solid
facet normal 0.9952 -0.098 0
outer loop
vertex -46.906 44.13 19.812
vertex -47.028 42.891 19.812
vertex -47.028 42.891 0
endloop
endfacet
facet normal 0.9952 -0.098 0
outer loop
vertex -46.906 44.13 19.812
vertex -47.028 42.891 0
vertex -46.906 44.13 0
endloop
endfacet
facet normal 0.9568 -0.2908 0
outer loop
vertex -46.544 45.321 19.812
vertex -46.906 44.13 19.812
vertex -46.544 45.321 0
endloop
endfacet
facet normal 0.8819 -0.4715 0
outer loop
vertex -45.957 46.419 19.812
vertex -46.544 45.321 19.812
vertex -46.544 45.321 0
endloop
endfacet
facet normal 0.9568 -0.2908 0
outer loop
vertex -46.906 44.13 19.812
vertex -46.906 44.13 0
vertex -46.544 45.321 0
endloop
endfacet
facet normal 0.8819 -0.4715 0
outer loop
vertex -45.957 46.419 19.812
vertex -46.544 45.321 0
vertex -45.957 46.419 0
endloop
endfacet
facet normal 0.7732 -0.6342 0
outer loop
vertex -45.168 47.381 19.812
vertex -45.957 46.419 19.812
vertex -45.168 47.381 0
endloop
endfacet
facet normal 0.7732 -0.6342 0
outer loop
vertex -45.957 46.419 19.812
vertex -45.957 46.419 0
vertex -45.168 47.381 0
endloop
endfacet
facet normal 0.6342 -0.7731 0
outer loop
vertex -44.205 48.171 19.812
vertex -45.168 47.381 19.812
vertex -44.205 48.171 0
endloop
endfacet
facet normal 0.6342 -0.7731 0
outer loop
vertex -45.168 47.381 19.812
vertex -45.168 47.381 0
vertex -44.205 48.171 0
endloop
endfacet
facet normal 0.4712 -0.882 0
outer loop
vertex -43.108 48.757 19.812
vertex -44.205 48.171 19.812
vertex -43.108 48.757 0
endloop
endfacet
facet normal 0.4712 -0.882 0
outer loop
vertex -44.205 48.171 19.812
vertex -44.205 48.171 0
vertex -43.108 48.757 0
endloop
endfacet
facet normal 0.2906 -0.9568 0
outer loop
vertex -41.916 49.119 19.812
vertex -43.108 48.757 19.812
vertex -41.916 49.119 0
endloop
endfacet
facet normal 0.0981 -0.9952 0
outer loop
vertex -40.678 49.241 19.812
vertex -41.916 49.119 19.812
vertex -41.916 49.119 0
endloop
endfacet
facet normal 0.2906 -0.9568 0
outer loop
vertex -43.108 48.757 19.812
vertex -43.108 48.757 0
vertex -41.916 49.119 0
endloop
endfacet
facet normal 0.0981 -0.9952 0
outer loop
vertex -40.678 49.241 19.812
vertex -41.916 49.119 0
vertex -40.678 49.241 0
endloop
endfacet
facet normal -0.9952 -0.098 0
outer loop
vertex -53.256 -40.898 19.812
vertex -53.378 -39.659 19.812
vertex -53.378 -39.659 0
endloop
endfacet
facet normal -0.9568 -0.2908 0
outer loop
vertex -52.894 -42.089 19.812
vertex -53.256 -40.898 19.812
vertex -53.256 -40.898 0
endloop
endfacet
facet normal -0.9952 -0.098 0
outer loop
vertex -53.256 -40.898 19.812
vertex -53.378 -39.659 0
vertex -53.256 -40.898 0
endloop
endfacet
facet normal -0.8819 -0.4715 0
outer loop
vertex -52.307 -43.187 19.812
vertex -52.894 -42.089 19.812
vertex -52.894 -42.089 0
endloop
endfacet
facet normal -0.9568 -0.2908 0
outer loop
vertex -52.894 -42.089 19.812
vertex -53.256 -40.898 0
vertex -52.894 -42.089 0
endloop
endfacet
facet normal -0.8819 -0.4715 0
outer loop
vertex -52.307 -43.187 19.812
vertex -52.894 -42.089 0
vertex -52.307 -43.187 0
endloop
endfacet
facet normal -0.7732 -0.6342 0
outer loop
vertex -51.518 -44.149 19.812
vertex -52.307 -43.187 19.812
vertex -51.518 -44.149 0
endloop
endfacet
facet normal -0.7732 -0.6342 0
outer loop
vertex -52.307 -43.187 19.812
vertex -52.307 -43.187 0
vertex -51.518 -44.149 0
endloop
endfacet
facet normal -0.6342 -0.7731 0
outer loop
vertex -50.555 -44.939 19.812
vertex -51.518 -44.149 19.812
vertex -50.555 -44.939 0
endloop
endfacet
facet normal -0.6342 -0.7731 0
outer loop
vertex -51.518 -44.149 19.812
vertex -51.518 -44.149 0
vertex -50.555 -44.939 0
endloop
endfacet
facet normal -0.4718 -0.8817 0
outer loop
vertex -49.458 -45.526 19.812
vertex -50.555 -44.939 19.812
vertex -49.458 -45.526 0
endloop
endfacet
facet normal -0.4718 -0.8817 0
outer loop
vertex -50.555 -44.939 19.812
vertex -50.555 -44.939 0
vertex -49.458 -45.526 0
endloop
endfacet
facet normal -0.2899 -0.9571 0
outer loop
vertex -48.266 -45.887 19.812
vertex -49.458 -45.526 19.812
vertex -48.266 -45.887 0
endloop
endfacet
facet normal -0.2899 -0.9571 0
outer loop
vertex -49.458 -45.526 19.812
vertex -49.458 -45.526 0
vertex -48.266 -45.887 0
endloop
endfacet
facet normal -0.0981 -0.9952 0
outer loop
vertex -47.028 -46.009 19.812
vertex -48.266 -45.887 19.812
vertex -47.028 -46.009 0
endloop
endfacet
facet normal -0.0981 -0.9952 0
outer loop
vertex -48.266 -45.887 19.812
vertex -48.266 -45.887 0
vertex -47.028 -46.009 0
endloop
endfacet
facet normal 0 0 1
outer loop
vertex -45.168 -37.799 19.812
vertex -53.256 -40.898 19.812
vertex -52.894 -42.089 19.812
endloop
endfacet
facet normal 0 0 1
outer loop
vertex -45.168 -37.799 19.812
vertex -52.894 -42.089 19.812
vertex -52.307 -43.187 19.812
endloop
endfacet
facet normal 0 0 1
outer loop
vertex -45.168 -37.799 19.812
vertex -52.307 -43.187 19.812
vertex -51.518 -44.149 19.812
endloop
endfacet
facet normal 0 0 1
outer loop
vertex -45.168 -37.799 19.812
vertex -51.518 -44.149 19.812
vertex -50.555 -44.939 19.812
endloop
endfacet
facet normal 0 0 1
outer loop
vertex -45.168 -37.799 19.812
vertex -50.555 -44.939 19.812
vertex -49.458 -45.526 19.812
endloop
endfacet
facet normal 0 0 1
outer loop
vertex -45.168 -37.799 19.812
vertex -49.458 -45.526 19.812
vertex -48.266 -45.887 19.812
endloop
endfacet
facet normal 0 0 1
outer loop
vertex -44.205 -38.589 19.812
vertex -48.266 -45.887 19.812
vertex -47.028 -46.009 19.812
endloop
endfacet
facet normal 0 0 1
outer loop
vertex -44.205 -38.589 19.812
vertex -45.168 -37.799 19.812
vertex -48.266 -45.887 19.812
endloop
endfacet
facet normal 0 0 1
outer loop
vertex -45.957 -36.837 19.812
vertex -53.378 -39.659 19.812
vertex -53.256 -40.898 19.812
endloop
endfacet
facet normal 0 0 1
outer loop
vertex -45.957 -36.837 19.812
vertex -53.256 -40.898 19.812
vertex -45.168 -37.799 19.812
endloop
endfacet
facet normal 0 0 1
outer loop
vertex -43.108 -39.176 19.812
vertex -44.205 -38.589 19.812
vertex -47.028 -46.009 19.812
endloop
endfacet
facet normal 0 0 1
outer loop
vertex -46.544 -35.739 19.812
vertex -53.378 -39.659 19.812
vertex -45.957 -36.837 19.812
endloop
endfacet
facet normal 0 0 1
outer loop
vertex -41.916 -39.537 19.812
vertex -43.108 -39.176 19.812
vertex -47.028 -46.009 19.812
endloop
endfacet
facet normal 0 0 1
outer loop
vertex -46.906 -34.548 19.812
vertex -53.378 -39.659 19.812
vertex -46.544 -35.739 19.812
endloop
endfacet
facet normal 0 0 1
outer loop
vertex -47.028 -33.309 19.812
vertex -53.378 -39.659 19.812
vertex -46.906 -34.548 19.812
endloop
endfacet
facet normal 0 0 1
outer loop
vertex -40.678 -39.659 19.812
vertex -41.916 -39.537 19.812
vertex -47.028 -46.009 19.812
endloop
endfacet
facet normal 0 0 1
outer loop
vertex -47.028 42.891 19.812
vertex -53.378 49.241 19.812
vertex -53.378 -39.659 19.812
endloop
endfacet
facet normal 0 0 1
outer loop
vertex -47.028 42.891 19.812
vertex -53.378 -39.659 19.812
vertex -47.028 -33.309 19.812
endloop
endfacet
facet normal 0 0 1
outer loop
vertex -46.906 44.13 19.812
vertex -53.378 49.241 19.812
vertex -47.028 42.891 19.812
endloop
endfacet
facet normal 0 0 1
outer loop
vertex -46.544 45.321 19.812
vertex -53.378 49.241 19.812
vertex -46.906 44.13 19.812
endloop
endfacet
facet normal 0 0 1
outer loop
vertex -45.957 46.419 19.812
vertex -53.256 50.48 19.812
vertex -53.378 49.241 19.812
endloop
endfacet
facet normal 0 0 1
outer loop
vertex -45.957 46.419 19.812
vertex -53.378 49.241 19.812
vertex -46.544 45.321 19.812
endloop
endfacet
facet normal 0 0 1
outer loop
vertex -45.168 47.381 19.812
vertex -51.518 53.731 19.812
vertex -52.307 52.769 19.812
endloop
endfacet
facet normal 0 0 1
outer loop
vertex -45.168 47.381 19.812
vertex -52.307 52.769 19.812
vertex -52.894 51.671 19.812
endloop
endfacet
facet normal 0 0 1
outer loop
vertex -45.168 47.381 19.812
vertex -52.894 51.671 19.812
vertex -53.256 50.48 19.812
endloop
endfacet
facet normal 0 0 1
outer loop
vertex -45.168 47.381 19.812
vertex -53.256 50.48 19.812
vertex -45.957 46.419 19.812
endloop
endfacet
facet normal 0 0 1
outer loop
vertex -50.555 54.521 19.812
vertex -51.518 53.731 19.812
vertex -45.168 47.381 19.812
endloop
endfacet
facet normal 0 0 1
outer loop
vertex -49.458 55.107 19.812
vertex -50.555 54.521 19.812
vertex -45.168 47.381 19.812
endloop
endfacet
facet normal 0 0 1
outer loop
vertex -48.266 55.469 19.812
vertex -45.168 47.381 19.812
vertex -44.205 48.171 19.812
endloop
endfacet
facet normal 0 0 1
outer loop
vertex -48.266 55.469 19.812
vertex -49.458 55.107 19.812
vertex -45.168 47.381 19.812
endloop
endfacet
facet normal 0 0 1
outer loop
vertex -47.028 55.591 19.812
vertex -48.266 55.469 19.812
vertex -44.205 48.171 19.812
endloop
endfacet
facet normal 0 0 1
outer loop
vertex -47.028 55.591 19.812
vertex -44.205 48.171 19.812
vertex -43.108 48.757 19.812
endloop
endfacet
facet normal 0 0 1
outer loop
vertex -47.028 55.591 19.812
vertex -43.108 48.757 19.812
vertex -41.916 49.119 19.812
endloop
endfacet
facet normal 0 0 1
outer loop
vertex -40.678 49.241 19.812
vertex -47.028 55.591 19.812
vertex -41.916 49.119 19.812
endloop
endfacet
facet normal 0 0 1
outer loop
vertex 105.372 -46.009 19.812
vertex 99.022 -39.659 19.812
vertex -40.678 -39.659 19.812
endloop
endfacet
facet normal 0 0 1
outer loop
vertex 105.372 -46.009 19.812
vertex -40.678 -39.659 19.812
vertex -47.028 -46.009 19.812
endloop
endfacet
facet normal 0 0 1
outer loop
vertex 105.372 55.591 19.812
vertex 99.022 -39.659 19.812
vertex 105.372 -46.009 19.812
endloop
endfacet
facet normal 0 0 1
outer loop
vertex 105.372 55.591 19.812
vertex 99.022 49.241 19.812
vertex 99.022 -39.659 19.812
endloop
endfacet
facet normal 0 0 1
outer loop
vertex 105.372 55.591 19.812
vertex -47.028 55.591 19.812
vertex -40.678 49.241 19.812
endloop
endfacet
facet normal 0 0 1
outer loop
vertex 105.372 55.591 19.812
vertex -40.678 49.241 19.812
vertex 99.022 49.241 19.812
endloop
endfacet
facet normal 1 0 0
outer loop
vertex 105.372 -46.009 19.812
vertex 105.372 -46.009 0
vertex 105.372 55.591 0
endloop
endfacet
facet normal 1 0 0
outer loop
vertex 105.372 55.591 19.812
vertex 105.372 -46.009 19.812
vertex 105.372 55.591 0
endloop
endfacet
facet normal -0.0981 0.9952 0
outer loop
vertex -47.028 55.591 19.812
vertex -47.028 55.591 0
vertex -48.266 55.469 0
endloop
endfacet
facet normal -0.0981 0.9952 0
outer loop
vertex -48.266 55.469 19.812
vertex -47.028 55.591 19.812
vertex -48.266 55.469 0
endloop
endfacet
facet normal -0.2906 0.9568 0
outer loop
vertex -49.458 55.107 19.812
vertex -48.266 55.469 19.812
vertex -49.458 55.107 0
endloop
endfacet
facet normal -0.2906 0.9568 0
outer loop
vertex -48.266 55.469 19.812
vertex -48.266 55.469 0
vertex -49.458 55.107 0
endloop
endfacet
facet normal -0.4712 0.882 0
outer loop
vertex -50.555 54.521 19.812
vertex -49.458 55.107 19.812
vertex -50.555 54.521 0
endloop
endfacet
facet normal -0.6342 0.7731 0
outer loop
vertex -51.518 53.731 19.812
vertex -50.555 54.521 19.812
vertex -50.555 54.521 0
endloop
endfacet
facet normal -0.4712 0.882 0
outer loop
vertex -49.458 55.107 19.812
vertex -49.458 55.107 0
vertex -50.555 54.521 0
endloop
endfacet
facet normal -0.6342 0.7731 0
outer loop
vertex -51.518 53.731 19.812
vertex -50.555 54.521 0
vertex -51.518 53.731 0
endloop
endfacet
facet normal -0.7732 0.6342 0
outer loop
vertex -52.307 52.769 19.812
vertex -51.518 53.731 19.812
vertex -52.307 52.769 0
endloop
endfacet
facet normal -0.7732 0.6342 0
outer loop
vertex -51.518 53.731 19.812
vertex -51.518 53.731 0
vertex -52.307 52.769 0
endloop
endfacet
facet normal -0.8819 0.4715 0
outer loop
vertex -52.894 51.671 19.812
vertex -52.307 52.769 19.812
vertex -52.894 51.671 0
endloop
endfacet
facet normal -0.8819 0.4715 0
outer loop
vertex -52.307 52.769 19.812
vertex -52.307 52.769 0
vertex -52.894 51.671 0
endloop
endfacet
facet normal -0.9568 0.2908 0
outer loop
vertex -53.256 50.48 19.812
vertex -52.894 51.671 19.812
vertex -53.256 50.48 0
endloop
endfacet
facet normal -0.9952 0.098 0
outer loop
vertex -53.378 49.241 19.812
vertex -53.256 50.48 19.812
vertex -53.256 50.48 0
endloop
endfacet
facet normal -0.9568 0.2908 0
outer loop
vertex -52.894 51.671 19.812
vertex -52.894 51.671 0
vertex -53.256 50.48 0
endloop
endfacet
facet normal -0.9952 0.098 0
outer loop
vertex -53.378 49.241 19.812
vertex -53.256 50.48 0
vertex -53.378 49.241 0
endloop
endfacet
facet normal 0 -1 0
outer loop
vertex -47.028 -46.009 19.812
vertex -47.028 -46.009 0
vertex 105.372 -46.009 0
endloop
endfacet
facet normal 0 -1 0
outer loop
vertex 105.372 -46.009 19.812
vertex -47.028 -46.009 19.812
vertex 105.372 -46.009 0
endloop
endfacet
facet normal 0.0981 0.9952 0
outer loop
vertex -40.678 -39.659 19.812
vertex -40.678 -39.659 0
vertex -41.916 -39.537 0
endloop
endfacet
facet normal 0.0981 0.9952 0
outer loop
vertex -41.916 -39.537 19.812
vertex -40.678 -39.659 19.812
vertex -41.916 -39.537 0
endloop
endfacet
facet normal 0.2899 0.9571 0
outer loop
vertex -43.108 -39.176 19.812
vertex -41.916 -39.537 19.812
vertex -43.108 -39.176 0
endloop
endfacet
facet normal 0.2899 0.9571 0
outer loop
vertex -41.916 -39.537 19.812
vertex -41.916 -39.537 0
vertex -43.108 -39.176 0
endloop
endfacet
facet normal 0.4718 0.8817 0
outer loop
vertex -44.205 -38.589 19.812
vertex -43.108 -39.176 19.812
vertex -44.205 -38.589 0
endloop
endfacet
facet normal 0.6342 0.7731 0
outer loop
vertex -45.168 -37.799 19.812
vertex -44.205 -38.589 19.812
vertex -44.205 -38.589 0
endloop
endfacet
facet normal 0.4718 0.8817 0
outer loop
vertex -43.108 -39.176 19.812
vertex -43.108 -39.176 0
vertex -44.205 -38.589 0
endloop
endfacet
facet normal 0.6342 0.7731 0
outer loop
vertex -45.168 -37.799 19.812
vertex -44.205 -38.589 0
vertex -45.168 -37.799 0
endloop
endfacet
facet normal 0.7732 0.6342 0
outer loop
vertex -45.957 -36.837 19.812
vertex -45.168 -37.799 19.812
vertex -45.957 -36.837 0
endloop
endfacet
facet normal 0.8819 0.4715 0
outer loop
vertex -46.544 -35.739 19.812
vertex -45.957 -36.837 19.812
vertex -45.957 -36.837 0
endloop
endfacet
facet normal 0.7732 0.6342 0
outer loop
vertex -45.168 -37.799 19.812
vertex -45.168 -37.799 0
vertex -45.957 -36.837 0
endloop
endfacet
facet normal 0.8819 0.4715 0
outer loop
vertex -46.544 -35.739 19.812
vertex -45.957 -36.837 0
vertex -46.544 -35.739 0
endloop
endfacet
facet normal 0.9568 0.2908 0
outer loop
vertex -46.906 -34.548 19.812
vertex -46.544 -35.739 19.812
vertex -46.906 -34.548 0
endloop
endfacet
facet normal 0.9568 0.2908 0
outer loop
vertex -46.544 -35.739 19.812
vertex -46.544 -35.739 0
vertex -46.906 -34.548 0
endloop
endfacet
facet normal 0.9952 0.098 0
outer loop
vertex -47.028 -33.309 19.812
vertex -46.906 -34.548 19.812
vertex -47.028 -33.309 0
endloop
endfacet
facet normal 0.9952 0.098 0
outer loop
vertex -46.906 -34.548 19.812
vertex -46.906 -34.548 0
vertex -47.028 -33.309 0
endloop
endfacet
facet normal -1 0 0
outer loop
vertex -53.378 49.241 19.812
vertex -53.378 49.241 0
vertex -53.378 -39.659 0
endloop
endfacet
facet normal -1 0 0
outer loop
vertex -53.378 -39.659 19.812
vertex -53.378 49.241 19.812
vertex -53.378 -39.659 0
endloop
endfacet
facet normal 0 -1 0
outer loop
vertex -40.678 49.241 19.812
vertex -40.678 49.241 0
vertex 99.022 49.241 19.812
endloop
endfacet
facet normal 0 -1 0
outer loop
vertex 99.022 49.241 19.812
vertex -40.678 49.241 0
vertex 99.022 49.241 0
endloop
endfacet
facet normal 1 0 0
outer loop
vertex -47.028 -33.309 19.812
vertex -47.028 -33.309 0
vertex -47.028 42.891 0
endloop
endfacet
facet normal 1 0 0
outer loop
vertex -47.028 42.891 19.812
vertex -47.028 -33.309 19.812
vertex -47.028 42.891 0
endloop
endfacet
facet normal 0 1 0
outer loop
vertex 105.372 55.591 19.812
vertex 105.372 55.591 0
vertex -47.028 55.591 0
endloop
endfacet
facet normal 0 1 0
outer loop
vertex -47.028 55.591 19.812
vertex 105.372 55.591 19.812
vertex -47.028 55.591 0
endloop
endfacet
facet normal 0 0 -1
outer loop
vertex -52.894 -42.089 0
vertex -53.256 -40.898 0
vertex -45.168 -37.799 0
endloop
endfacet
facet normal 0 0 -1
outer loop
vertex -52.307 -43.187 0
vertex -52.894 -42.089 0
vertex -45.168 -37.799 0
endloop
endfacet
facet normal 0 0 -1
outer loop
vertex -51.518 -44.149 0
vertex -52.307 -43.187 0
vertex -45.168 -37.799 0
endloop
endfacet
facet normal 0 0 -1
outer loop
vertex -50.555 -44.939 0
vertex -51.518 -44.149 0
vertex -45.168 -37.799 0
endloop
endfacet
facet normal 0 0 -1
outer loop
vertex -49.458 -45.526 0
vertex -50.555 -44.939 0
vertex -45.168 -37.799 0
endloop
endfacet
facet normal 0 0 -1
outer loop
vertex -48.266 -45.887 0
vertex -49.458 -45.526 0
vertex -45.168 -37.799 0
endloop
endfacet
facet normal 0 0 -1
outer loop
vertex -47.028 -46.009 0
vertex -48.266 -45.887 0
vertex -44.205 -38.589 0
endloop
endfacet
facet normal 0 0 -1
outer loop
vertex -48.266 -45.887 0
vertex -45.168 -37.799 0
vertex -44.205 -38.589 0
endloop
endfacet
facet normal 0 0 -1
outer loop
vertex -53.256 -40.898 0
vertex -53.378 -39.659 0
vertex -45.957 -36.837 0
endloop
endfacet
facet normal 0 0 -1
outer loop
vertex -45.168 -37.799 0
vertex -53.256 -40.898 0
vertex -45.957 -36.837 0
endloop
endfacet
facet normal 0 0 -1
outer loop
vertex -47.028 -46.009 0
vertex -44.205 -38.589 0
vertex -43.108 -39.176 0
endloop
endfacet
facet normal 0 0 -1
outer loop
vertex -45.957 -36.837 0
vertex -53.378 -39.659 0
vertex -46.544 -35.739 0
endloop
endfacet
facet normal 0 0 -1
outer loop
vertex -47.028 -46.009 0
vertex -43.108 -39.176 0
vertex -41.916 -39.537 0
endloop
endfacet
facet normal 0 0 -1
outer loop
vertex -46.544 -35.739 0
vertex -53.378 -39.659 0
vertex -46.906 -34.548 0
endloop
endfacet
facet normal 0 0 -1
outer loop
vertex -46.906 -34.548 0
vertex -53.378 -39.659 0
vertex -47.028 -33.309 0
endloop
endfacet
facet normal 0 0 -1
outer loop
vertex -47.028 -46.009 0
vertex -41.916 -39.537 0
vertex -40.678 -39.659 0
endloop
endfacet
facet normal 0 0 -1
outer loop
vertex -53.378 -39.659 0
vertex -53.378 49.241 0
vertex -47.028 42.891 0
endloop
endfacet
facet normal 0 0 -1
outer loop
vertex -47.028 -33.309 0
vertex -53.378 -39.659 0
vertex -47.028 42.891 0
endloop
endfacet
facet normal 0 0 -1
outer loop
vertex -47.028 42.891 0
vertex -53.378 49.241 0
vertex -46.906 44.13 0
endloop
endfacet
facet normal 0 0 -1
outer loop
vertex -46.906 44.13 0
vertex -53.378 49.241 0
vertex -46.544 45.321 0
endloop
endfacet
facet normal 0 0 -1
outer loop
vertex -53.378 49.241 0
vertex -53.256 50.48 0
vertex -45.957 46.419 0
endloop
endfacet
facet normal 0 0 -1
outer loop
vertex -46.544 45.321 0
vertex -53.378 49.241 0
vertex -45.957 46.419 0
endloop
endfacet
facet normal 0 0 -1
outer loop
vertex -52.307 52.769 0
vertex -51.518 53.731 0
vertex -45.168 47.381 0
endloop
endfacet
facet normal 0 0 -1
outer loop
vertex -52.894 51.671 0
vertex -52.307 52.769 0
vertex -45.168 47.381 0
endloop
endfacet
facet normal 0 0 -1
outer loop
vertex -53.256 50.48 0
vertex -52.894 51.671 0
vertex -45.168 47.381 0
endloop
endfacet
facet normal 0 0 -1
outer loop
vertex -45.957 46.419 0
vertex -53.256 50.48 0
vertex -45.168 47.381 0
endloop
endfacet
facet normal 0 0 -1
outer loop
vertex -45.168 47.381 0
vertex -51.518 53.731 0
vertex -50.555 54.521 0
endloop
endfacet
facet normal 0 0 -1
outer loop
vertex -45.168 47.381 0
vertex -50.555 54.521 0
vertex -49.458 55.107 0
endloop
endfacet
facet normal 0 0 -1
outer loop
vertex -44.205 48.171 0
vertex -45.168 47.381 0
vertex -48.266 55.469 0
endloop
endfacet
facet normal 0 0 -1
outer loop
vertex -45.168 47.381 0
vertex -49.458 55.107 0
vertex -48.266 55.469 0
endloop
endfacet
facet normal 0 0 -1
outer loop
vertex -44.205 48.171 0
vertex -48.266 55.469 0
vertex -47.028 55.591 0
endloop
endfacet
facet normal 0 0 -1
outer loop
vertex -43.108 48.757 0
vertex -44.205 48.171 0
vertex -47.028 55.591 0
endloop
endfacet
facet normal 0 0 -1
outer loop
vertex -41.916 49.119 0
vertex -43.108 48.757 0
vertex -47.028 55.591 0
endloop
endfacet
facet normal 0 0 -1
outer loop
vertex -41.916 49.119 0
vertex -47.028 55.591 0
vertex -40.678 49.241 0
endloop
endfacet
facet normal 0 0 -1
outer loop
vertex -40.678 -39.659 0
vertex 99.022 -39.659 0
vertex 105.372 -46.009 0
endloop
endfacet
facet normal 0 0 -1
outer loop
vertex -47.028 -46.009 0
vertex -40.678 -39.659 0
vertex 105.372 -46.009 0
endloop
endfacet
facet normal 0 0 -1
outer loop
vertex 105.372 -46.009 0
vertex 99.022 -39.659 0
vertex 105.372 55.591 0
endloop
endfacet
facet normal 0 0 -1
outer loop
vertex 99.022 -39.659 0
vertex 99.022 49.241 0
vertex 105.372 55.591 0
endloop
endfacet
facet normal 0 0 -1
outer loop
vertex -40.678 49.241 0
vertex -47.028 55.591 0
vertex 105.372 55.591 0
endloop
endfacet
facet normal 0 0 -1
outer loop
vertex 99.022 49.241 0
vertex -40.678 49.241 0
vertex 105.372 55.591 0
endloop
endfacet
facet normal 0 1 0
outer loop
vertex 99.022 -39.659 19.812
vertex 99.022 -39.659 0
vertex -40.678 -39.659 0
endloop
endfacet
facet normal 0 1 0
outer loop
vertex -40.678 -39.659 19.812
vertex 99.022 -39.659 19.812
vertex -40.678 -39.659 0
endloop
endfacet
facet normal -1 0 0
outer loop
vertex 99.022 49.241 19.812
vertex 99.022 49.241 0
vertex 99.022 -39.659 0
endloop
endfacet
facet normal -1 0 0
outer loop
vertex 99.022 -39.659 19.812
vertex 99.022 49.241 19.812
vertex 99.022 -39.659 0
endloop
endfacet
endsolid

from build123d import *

# Parameters (mm, degrees)
F1_DEPTH = 19.812


with BuildPart() as f1:
    # F0 (on Top) → F1 (new body)
    with BuildSketch(Plane.XY):
        with BuildLine():
            Line((105.372425, 55.590845), (-47.027575, 55.590845))
            ThreePointArc((-47.027575, 55.590845), (-51.517703, 53.730973), (-53.377575, 49.240845))
            Line((-53.377575, 49.240845), (-53.377575, -39.659155))
            ThreePointArc((-53.377575, -39.659155), (-51.517703, -44.149283), (-47.027575, -46.009155))
            Line((-47.027575, -46.009155), (105.372425, -46.009155))
            Line((105.372425, -46.009155), (105.372425, 55.590845))
        make_face()
        Polygon((-47.027575, 42.890845), (-47.027575, 49.240845), (-40.677575, 49.240845), (99.022425, 49.240845), (99.022425, -39.659155), (-40.677575, -39.659155), (-47.027575, -39.659155), (-47.027575, -33.309155), align=None, mode=Mode.SUBTRACT)
        with BuildLine():
            Line((-40.677575, 49.240845), (-47.027575, 49.240845))
            Line((-47.027575, 49.240845), (-47.027575, 42.890845))
            ThreePointArc((-47.027575, 42.890845), (-45.167703, 47.380973), (-40.677575, 49.240845))
        make_face()
        with BuildLine():
            ThreePointArc((-40.677575, -39.659155), (-45.167703, -37.799283), (-47.027575, -33.309155))
            Line((-47.027575, -33.309155), (-47.027575, -39.659155))
            Line((-47.027575, -39.659155), (-40.677575, -39.659155))
        make_face()
    extrude(amount=F1_DEPTH)


solid = f1.part
